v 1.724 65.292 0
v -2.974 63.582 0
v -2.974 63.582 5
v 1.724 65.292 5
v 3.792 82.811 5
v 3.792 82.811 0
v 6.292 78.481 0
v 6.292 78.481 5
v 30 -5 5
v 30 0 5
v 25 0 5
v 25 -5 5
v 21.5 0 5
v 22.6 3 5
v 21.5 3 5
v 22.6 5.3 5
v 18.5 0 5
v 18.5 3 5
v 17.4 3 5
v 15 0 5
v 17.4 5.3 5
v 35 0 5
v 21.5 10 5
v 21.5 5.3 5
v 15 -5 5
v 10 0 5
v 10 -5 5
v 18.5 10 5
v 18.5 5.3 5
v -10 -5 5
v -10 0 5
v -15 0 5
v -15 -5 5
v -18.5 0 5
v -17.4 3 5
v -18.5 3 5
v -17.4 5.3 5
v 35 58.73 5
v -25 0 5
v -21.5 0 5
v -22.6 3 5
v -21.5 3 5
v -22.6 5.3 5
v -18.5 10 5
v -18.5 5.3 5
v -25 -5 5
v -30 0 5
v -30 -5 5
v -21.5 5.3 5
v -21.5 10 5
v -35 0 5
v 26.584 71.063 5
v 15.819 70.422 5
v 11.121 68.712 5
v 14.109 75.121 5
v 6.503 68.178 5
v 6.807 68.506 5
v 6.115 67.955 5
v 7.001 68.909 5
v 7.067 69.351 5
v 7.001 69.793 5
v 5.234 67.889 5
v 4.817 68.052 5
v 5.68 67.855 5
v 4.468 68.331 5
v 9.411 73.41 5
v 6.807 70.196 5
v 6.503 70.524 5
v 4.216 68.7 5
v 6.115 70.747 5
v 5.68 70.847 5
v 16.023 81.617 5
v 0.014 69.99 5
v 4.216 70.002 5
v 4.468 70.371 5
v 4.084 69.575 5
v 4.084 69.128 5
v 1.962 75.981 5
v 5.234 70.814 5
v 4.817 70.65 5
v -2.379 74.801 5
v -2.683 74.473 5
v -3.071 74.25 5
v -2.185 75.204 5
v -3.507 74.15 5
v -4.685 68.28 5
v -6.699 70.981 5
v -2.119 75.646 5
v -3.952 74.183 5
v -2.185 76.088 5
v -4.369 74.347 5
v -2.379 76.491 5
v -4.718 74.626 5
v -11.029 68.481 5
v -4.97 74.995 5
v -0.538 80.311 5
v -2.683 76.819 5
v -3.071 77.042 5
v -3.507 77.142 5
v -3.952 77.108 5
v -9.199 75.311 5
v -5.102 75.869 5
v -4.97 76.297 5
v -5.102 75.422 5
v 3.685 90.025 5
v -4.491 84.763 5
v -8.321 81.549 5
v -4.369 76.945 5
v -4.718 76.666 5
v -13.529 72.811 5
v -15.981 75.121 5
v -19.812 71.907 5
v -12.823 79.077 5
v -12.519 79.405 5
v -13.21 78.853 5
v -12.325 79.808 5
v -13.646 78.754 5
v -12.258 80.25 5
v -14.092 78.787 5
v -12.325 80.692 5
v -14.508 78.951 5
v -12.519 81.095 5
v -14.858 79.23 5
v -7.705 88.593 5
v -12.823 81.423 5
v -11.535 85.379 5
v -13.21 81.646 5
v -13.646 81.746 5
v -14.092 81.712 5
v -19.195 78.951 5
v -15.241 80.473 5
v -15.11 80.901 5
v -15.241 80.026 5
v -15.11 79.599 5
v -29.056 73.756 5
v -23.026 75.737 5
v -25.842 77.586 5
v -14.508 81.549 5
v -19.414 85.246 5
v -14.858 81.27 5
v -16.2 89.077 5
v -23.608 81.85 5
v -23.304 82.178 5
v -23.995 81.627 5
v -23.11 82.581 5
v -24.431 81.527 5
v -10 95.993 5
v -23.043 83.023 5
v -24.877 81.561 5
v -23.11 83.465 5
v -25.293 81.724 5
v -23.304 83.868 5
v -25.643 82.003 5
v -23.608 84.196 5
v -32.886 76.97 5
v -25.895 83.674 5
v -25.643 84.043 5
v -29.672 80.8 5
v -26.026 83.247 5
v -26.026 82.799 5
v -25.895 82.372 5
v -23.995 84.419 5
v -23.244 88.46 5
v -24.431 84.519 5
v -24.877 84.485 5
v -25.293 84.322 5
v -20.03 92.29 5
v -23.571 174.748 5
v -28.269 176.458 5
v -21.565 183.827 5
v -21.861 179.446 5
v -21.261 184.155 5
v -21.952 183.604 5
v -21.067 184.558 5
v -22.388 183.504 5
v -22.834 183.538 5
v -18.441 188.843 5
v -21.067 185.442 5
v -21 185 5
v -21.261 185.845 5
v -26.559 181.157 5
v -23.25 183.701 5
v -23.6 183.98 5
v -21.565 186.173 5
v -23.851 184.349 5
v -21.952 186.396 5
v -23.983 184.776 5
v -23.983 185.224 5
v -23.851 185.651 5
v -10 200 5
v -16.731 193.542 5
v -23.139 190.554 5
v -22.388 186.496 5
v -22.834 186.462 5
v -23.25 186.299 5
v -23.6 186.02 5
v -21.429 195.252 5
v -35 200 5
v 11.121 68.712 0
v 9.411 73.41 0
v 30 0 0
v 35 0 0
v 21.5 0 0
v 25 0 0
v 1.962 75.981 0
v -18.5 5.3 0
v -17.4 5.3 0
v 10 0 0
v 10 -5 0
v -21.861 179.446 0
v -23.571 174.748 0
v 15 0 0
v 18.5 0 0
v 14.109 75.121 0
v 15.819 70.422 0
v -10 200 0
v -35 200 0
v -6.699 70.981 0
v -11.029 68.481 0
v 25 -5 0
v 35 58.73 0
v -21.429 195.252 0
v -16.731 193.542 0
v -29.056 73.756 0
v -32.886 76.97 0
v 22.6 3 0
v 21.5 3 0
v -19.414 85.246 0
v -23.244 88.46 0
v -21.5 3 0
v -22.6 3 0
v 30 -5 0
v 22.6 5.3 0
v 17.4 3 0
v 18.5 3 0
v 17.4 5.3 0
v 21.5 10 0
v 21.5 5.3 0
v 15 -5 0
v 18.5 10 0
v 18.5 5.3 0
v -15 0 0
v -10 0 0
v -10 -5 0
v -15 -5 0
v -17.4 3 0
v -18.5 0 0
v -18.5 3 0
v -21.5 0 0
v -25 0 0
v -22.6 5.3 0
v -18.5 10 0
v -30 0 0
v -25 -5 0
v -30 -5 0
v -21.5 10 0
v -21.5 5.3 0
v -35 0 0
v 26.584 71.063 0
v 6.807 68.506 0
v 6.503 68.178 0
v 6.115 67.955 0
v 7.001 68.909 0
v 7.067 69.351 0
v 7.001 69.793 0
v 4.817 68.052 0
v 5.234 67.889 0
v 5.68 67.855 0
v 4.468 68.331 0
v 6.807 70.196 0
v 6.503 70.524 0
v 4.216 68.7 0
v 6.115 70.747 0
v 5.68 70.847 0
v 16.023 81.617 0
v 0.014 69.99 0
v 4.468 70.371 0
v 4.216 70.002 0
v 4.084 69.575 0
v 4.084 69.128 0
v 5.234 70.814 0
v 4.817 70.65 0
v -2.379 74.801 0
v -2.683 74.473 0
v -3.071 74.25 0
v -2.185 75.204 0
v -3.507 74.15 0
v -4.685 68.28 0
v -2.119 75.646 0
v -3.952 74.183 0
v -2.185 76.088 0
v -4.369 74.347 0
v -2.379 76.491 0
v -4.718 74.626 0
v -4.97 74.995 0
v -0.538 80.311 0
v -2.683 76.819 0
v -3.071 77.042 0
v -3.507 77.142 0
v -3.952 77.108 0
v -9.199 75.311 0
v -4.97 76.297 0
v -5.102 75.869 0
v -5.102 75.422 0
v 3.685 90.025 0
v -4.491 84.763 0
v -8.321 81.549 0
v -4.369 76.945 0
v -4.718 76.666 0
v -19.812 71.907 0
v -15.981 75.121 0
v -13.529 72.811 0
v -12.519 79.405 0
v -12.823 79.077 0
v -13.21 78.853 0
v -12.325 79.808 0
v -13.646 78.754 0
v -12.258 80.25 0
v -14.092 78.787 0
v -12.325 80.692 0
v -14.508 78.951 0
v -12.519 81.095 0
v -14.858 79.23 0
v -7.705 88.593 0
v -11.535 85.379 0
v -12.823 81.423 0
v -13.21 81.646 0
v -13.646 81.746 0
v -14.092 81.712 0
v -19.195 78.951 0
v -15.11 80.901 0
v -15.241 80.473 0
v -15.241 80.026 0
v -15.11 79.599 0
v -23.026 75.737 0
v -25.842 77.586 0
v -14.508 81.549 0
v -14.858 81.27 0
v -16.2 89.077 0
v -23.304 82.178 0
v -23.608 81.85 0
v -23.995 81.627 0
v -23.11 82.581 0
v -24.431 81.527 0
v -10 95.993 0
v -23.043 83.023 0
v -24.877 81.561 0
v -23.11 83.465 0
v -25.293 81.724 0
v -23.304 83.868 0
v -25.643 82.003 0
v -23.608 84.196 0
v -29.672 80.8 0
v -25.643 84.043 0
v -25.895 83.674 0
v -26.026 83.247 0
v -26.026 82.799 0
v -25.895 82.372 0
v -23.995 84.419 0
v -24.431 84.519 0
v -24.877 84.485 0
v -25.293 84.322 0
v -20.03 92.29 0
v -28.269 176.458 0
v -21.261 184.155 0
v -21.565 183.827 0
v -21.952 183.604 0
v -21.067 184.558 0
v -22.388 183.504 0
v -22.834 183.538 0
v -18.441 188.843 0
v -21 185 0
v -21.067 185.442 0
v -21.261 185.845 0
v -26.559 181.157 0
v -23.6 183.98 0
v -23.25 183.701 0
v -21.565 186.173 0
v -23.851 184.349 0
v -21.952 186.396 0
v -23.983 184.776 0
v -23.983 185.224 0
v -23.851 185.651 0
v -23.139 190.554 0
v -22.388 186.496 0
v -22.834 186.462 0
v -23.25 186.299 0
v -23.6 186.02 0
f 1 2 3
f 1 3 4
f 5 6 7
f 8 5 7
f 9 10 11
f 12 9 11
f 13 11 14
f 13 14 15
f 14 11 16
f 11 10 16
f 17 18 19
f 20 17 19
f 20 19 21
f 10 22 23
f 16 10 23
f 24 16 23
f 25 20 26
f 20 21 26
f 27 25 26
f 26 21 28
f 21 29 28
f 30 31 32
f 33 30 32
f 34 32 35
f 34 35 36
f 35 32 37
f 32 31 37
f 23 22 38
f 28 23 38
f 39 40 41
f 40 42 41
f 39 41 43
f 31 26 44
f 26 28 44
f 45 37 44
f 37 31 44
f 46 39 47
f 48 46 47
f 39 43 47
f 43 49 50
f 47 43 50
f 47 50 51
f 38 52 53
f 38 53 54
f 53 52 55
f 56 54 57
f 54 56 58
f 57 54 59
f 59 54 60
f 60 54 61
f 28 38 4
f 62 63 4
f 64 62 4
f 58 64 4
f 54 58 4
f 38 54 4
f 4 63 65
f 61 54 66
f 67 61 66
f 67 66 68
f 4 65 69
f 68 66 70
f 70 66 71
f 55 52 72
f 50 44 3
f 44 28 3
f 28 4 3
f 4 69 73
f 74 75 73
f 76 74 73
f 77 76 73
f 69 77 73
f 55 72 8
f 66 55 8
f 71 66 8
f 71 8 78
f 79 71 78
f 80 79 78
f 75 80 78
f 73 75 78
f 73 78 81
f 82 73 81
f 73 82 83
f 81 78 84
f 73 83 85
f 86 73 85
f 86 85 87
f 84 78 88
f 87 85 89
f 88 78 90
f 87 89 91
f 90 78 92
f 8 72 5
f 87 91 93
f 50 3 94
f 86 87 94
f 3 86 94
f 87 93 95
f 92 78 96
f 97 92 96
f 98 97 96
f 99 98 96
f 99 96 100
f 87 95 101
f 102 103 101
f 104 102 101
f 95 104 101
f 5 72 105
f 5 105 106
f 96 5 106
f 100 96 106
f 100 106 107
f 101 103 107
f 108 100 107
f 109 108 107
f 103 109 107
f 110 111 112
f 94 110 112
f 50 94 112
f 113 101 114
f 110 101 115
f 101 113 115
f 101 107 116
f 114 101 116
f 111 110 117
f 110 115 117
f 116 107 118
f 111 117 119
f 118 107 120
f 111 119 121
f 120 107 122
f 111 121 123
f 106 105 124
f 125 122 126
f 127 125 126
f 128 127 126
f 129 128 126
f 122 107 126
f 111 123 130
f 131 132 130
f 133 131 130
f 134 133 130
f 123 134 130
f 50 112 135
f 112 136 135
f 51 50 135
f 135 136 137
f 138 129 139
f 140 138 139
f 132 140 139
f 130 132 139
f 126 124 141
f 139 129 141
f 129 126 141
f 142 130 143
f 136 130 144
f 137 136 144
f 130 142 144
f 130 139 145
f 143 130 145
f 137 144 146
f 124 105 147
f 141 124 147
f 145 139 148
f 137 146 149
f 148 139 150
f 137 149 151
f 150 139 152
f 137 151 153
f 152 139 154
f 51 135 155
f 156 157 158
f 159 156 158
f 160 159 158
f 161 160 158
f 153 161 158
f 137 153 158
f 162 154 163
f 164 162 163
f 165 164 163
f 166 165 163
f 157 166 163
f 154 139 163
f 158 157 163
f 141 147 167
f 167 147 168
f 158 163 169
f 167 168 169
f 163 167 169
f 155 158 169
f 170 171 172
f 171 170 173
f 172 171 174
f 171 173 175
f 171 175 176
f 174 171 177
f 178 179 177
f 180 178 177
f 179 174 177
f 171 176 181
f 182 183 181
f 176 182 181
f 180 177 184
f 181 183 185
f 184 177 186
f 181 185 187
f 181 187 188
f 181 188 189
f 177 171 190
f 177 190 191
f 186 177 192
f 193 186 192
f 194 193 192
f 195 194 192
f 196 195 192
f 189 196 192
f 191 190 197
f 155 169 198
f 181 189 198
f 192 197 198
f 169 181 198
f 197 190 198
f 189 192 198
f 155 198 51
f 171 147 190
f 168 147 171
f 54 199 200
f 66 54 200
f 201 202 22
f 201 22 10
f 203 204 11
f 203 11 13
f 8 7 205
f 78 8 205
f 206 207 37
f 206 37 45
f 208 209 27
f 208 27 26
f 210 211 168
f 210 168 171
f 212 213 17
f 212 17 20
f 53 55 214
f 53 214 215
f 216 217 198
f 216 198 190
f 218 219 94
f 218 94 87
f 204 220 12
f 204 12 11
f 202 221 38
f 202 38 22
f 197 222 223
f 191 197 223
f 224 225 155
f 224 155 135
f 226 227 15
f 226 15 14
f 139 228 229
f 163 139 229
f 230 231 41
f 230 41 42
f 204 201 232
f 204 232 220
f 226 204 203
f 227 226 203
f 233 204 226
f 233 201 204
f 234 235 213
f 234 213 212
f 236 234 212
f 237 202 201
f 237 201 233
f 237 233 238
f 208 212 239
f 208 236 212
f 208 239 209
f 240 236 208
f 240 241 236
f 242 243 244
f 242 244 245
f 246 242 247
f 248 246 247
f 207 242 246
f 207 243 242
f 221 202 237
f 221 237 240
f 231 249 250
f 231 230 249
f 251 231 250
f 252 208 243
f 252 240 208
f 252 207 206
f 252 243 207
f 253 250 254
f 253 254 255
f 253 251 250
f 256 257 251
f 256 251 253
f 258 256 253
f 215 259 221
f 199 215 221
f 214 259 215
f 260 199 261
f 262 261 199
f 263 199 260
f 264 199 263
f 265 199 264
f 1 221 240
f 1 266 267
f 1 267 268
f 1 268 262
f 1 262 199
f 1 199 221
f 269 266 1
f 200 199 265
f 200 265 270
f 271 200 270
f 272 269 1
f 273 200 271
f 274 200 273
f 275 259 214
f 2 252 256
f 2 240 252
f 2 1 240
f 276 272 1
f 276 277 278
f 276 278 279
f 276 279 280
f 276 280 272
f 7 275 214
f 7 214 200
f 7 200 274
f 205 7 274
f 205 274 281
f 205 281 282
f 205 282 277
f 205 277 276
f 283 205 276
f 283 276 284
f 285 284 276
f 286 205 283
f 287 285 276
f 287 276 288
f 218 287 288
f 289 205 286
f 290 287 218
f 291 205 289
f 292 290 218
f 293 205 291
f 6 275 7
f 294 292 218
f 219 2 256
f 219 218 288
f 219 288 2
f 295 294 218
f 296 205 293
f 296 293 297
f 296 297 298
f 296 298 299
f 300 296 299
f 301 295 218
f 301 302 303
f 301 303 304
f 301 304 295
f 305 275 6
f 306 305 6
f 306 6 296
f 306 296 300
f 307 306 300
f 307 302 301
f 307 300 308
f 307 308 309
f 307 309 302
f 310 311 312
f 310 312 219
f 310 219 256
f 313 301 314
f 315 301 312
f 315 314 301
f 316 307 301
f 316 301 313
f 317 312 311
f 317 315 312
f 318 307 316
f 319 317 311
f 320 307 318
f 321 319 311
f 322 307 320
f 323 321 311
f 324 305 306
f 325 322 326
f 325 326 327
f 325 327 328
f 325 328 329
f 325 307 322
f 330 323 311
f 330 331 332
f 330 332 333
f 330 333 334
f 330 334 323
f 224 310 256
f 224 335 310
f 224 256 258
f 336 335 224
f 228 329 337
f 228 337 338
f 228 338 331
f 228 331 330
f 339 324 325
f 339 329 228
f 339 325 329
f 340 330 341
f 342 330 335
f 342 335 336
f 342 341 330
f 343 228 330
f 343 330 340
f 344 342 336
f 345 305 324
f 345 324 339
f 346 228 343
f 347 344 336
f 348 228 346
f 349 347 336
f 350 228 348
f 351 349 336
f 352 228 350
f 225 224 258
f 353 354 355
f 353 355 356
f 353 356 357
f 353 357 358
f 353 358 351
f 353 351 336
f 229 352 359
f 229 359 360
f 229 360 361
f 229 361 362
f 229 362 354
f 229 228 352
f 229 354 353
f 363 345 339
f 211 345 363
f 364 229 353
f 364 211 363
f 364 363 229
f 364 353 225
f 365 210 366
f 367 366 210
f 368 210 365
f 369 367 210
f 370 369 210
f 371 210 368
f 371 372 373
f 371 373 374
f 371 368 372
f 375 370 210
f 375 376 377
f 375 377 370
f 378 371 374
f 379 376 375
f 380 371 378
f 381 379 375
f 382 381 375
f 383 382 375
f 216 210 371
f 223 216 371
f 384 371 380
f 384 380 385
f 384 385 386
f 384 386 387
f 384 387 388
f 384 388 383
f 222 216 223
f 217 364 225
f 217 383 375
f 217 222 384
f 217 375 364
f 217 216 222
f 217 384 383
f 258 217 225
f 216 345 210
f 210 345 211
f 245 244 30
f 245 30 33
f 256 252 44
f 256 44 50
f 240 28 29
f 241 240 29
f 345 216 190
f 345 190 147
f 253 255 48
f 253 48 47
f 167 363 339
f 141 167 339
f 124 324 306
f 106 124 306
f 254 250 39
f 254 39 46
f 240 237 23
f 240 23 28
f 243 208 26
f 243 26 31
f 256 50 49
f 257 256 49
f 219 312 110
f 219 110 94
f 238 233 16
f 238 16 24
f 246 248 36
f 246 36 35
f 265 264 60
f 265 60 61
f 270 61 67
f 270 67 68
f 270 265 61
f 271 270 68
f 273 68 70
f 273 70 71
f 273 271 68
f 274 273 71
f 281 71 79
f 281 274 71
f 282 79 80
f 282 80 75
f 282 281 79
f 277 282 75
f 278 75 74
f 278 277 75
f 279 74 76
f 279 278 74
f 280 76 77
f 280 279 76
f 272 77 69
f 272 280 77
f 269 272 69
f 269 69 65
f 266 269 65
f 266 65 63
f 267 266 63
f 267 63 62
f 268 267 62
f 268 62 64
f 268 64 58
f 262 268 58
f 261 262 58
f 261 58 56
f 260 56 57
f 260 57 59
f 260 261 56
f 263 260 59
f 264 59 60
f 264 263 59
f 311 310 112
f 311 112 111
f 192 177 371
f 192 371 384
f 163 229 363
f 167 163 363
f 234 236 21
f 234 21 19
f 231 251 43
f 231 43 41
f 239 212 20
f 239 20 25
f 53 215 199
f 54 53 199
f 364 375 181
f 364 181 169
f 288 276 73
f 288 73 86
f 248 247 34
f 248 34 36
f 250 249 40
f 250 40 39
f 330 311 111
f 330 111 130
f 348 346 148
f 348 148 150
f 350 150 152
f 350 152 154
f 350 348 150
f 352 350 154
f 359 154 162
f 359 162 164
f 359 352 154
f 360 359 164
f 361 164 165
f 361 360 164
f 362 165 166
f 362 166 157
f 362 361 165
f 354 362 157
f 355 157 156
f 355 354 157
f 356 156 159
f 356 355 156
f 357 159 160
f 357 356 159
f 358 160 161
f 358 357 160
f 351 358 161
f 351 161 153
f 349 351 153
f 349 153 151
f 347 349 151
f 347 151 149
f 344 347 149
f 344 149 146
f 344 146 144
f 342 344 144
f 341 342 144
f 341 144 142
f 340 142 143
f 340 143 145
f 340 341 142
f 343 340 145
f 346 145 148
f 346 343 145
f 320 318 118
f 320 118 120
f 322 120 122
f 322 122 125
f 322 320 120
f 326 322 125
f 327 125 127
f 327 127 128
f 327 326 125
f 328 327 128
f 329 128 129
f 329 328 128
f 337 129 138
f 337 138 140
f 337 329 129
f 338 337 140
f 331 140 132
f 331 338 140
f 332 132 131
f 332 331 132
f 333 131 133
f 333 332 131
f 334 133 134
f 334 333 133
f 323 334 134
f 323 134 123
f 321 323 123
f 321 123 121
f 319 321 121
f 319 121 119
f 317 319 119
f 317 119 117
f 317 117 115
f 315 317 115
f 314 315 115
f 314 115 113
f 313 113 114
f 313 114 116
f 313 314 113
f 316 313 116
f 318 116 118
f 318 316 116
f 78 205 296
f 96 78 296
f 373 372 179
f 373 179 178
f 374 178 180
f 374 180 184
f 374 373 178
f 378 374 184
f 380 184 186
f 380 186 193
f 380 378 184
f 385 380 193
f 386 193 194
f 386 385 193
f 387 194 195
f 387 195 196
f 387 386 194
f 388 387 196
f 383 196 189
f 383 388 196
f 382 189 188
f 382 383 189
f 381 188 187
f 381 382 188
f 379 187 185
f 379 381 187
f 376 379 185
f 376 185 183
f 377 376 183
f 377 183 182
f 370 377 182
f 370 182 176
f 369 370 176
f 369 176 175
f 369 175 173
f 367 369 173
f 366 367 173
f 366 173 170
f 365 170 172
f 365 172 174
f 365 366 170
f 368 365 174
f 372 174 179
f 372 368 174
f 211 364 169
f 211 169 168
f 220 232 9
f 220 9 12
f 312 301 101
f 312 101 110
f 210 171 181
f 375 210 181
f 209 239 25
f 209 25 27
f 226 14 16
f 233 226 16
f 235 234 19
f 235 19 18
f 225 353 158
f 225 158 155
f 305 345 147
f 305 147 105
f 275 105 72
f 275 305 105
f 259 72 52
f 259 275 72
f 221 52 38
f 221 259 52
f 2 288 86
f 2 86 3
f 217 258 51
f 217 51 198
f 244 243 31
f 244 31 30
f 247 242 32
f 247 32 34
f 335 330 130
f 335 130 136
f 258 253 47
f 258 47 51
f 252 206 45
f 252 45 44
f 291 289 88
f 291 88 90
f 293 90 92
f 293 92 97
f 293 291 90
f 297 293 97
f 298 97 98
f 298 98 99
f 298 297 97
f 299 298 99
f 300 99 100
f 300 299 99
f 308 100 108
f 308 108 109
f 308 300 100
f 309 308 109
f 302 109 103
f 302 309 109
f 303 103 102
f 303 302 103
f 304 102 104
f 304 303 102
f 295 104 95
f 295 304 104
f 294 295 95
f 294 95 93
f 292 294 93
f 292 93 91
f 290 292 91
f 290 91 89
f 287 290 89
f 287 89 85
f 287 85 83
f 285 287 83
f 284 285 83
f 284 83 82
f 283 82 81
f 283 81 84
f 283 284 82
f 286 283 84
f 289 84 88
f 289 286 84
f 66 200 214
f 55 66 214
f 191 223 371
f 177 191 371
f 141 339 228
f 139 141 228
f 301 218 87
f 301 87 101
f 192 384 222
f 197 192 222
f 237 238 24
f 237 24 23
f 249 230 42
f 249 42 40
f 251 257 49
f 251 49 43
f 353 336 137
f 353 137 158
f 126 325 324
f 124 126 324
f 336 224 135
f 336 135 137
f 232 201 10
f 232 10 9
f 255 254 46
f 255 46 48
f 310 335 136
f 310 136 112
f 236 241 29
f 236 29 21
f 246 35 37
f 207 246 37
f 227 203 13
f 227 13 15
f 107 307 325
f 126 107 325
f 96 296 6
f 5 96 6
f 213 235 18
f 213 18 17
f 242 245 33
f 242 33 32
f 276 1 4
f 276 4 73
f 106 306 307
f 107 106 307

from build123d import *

# Parameters (mm, degrees)
ESQUISSE1_R        = 1.5
BOSS_EXTRU_1_DEPTH = 5


with BuildPart() as part:
    # Esquisse1 → Boss.-Extru.1 (new body)
    with BuildSketch(Plane.XY):
        with BuildLine():
            Line((-21.5, 0), (-25, 0))
            Line((-25, 0), (-25, -5))
            Line((-25, -5), (-30, -5))
            Line((-30, -5), (-30, 0))
            Line((-30, 0), (-35, 0))
            Line((-35, 0), (-35, 200))
            Line((-35, 200), (-10, 200))
            Line((-10, 200), (-10, 95.993420768))
            ThreePointArc((-10, 95.993420768), (16.02346259, 81.616607057), (35, 58.729833462))
            Line((35, 58.729833462), (35, 0))
            Line((35, 0), (30, 0))
            Line((30, 0), (30, -5))
            Line((30, -5), (25, -5))
            Line((25, -5), (25, 0))
            Line((25, 0), (21.5, 0))
            Line((21.5, 0), (21.5, 3))
            Line((21.5, 3), (22.6, 3))
            Line((22.6, 3), (22.6, 5.3))
            Line((22.6, 5.3), (21.5, 5.3))
            Line((21.5, 5.3), (21.5, 10))
            Line((21.5, 10), (18.5, 10))
            Line((18.5, 10), (18.5, 5.3))
            Line((18.5, 5.3), (17.4, 5.3))
            Line((17.4, 5.3), (17.4, 3))
            Line((17.4, 3), (18.5, 3))
            Line((18.5, 3), (18.5, 0))
            Line((18.5, 0), (15, 0))
            Line((15, 0), (15, -5))
            Line((15, -5), (10, -5))
            Line((10, -5), (10, 0))
            Line((10, 0), (-10, 0))
            Line((-10, 0), (-10, -5))
            Line((-10, -5), (-15, -5))
            Line((-15, -5), (-15, 0))
            Line((-15, 0), (-18.5, 0))
            Line((-18.5, 0), (-18.5, 3))
            Line((-18.5, 3), (-17.4, 3))
            Line((-17.4, 3), (-17.4, 5.3))
            Line((-17.4, 5.3), (-18.5, 5.3))
            Line((-18.5, 5.3), (-18.5, 10))
            Line((-18.5, 10), (-21.5, 10))
            Line((-21.5, 10), (-21.5, 5.3))
            Line((-21.5, 5.3), (-22.6, 5.3))
            Line((-22.6, 5.3), (-22.6, 3))
            Line((-22.6, 3), (-21.5, 3))
            Line((-21.5, 3), (-21.5, 0))
        make_face()
        with Locations((-24.543125869, 83.023041686)):
            Circle(ESQUISSE1_R, mode=Mode.SUBTRACT)
        with Locations((-13.758152943, 80.249762934)):
            Circle(ESQUISSE1_R, mode=Mode.SUBTRACT)
        with Locations((-3.618602792, 75.645825623)):
            Circle(ESQUISSE1_R, mode=Mode.SUBTRACT)
        with Locations((5.567439485, 69.351118058)):
            Circle(ESQUISSE1_R, mode=Mode.SUBTRACT)
        with Locations((-22.5, 185)):
            Circle(ESQUISSE1_R, mode=Mode.SUBTRACT)
        Polygon((-29.672175025, 80.799788495), (-32.886113073, 76.969566279), (-29.055890858, 73.755628231), (-25.841952809, 77.585850447), align=None, mode=Mode.SUBTRACT)
        Polygon((-23.244298928, 88.460232926), (-20.03036088, 92.290455142), (-16.200138664, 89.076517093), (-19.414076712, 85.246294878), align=None, mode=Mode.SUBTRACT)
        Polygon((-19.195344183, 78.950935993), (-23.025566399, 75.736997945), (-19.81162835, 71.906775729), (-15.981406135, 75.120713778), align=None, mode=Mode.SUBTRACT)
        Polygon((-11.534899752, 85.37881209), (-7.704677536, 88.592750139), (-4.490739488, 84.762527923), (-8.320961703, 81.548589875), align=None, mode=Mode.SUBTRACT)
        Polygon((-9.198729811, 75.310889132), (-13.52885683, 72.810889132), (-11.02885683, 68.480762114), (-6.698729811, 70.980762114), align=None, mode=Mode.SUBTRACT)
        Polygon((-0.538475773, 80.310889132), (3.791651246, 82.810889132), (6.291651246, 78.480762114), (1.961524227, 75.980762114), align=None, mode=Mode.SUBTRACT)
        Polygon((0.013926023, 69.990248894), (-4.684537081, 68.280148177), (-2.974436364, 63.581685073), (1.72402674, 65.29178579), align=None, mode=Mode.SUBTRACT)
        Polygon((9.410852231, 73.410450327), (14.109315335, 75.120551044), (15.819416051, 70.42208794), (11.120952947, 68.711987223), align=None, mode=Mode.SUBTRACT)
        Polygon((-26.559332269, 181.156587254), (-28.269432985, 176.45812415), (-23.570969881, 174.748023434), (-21.860869165, 179.446486538), align=None, mode=Mode.SUBTRACT)
        Polygon((-23.139130835, 190.553513462), (-21.429030119, 195.251976566), (-16.730567015, 193.54187585), (-18.440667731, 188.843412746), align=None, mode=Mode.SUBTRACT)
    extrude(amount=BOSS_EXTRU_1_DEPTH)


solid = part.part
